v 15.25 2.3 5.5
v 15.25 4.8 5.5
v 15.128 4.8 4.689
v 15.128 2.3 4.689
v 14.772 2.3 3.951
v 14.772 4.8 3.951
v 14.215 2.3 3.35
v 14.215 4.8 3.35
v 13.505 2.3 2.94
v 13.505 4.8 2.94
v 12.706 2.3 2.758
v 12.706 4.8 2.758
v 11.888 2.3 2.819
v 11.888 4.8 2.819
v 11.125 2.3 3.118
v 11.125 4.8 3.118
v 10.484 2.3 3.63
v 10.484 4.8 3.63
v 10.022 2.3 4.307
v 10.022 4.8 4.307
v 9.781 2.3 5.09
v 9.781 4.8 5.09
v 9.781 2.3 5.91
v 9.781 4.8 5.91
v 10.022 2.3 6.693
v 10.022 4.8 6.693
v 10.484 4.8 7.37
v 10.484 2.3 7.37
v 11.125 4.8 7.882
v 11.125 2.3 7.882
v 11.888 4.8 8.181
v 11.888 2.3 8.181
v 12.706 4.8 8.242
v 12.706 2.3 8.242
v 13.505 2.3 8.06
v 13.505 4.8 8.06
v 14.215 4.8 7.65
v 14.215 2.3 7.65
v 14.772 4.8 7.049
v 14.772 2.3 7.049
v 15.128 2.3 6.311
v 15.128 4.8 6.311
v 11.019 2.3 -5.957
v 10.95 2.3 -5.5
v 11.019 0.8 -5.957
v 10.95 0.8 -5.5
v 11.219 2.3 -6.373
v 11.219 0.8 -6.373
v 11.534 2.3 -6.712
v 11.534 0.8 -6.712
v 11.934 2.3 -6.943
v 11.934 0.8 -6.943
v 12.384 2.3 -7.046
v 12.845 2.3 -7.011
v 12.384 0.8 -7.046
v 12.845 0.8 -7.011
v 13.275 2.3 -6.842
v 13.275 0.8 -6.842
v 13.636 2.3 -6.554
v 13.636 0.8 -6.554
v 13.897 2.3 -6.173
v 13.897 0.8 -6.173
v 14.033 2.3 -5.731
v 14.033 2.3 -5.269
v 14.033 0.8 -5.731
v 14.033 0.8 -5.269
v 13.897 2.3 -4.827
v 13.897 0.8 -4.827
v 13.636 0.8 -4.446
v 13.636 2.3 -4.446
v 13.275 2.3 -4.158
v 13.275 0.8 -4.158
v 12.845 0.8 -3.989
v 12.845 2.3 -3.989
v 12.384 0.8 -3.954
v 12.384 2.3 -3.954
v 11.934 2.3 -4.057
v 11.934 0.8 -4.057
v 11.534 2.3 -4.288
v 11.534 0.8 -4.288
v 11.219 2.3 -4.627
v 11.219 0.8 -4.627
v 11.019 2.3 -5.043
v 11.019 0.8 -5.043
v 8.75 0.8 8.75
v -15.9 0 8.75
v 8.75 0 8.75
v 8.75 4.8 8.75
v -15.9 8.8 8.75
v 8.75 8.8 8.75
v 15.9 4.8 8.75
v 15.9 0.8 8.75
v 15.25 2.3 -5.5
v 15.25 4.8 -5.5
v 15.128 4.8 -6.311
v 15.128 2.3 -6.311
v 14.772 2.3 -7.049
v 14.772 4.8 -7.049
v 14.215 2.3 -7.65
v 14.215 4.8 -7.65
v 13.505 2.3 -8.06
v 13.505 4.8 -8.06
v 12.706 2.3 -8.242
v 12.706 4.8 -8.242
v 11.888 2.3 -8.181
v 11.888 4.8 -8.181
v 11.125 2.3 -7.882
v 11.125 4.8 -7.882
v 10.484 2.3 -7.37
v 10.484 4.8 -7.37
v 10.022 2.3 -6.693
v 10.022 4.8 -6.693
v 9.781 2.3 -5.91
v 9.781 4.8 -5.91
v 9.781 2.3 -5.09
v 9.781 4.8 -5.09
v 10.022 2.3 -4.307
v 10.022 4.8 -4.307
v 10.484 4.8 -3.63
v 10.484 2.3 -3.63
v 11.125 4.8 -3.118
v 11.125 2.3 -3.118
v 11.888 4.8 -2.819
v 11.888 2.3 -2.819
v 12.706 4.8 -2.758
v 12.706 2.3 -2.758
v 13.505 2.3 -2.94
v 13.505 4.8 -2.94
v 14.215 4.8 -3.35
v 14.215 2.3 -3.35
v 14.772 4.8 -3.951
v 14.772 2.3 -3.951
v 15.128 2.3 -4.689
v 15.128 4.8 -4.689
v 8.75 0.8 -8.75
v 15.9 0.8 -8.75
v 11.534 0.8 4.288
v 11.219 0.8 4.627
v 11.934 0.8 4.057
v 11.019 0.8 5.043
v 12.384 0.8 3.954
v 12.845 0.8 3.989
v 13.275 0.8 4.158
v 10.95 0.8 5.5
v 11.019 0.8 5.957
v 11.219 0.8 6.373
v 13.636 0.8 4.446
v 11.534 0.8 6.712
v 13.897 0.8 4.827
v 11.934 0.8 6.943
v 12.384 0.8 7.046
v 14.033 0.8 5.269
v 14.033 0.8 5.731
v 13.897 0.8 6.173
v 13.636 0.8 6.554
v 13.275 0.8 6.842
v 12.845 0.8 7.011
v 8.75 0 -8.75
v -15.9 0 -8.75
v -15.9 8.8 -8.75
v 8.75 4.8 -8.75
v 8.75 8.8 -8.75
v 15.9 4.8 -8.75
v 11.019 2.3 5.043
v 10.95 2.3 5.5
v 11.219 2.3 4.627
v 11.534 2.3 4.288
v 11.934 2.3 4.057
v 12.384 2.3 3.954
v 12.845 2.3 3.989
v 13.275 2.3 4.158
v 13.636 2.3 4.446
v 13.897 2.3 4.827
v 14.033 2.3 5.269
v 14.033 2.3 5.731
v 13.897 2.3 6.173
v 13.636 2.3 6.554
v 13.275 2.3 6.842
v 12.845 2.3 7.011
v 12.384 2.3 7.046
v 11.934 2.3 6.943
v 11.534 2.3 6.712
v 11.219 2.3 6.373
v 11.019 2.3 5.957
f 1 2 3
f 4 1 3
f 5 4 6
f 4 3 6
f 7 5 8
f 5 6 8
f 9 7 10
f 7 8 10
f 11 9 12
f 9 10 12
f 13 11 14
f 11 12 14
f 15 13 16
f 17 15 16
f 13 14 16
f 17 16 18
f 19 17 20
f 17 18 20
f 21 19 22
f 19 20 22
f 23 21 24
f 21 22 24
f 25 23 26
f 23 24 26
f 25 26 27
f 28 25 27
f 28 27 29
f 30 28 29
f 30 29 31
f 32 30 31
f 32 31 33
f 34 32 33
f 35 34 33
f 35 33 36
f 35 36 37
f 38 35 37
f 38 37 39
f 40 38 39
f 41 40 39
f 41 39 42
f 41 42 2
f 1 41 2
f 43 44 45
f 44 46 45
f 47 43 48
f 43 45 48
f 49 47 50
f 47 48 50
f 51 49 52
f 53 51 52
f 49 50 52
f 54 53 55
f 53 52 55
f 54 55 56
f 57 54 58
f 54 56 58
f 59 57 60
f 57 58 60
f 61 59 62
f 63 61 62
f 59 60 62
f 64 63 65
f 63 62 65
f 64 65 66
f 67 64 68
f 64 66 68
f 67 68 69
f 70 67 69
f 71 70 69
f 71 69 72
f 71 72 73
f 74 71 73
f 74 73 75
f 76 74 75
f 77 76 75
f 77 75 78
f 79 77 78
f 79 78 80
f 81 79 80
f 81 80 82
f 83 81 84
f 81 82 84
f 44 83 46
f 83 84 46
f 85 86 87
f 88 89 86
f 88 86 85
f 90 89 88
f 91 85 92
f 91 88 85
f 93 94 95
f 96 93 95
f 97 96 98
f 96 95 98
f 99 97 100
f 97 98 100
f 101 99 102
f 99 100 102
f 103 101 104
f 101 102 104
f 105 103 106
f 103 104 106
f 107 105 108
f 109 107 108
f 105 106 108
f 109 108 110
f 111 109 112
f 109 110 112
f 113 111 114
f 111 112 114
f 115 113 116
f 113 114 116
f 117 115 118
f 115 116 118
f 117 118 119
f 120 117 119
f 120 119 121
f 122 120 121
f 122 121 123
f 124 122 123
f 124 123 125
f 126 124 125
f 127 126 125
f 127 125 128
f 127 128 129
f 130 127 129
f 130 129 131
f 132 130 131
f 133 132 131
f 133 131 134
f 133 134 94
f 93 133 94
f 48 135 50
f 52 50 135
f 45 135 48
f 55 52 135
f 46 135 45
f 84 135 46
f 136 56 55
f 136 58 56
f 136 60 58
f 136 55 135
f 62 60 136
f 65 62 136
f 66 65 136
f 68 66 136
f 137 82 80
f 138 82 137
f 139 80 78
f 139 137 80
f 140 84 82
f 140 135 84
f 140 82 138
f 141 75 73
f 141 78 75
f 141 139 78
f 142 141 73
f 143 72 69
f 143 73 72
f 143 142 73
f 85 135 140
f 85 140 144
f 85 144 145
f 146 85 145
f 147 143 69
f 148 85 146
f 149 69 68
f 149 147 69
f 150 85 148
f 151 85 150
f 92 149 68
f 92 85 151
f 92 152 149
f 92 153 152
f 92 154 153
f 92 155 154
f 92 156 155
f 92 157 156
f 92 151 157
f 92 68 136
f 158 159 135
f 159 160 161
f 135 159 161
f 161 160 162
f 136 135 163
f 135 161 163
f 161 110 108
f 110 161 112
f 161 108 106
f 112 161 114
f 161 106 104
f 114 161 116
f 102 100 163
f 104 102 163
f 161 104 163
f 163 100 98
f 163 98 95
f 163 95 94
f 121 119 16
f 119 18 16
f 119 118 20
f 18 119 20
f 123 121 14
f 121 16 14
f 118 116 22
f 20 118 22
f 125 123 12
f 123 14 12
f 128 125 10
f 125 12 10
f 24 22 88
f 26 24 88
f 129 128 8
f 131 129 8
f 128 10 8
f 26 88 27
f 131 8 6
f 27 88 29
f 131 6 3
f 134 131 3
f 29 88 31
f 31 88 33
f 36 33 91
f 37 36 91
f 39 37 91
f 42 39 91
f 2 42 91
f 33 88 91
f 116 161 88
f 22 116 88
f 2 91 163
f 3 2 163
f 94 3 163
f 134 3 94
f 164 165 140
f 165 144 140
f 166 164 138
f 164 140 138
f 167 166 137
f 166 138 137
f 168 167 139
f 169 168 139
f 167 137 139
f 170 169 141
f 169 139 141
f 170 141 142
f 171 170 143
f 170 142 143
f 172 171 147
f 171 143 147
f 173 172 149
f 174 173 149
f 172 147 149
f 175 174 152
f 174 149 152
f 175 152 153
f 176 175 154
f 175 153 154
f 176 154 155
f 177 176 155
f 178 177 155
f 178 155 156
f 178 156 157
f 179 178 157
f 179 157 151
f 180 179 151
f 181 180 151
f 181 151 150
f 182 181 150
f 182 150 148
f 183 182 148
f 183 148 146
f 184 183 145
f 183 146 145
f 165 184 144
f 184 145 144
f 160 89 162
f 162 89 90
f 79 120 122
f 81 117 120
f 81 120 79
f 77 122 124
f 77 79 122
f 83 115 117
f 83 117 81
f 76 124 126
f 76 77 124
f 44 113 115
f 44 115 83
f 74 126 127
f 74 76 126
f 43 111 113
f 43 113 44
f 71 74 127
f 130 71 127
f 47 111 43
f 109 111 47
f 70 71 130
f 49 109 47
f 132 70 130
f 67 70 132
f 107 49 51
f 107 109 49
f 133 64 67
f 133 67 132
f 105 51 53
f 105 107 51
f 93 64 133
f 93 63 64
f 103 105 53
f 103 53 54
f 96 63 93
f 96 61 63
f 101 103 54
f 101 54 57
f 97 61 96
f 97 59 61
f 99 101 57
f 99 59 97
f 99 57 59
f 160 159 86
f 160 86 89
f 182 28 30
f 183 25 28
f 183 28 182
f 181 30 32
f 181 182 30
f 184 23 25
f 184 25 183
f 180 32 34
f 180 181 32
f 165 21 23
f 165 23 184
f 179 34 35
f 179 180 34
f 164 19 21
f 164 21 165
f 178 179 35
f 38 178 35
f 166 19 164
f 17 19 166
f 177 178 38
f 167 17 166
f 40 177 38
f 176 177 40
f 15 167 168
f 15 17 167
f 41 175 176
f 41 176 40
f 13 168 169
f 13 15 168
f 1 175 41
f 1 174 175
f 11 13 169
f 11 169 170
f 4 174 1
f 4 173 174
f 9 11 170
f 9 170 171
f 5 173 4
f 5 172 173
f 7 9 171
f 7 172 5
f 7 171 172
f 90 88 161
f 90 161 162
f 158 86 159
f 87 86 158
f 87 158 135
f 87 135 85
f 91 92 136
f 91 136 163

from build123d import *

# Parameters (mm, degrees)
SZKIC1_W                                          = 31.8
SZKIC1_H                                          = 8.8
DODANIE_WYCI_GNI_CIE1_DEPTH                       = 8.75
SZKIC2_W                                          = 7.15
SZKIC2_H                                          = 17.5
WYTNIJ_WYCI_GNI_CIE1_DEPTH                        = 0.8
SZKIC3_W                                          = 7.15
SZKIC3_H                                          = 4
WYTNIJ_WYCI_GNI_CIE2_DEPTH                        = 26.228951623
POG_BIENIE_WALCOWE_POD_M2_5_RUB_Z_BEM_D           = 3.1
POG_BIENIE_WALCOWE_POD_M2_5_RUB_Z_BEM_CBORE_D     = 5.5
POG_BIENIE_WALCOWE_POD_M2_5_RUB_Z_BEM_CBORE_DEPTH = 2.5


with BuildPart() as part:
    # Szkic1 → Dodanie-wyciągnięcie1 (new, symmetric)
    with BuildSketch(Plane.XY):
        with Locations((0, 4.4)):
            Rectangle(SZKIC1_W, SZKIC1_H)
    extrude(amount=DODANIE_WYCI_GNI_CIE1_DEPTH, both=True)

    # Szkic2 → Wytnij-wyciągnięcie1 (cut)
    with BuildSketch(Plane.XZ):
        with Locations((12.325, 0)):
            Rectangle(SZKIC2_W, SZKIC2_H)
    extrude(amount=-WYTNIJ_WYCI_GNI_CIE1_DEPTH, mode=Mode.SUBTRACT)

    # Szkic3 → Wytnij-wyciągnięcie2 (cut, through all)
    with BuildSketch(Plane.XY.offset(8.75)):
        with Locations((12.325, 6.8)):
            Rectangle(SZKIC3_W, SZKIC3_H)
    extrude(amount=-WYTNIJ_WYCI_GNI_CIE2_DEPTH, mode=Mode.SUBTRACT)

    # Pogłębienie walcowe pod M2.5 Śrubę z łbem walcowym z gniazdem1 (through all)
    with Locations(Plane(origin=(0, 4.8, 0), x_dir=(1, 0, 0), z_dir=(0, 1, 0))):
        with Locations((12.5, 5.5), (12.5, -5.5)):
            CounterBoreHole(POG_BIENIE_WALCOWE_POD_M2_5_RUB_Z_BEM_D / 2, POG_BIENIE_WALCOWE_POD_M2_5_RUB_Z_BEM_CBORE_D / 2, POG_BIENIE_WALCOWE_POD_M2_5_RUB_Z_BEM_CBORE_DEPTH)


solid = part.part
